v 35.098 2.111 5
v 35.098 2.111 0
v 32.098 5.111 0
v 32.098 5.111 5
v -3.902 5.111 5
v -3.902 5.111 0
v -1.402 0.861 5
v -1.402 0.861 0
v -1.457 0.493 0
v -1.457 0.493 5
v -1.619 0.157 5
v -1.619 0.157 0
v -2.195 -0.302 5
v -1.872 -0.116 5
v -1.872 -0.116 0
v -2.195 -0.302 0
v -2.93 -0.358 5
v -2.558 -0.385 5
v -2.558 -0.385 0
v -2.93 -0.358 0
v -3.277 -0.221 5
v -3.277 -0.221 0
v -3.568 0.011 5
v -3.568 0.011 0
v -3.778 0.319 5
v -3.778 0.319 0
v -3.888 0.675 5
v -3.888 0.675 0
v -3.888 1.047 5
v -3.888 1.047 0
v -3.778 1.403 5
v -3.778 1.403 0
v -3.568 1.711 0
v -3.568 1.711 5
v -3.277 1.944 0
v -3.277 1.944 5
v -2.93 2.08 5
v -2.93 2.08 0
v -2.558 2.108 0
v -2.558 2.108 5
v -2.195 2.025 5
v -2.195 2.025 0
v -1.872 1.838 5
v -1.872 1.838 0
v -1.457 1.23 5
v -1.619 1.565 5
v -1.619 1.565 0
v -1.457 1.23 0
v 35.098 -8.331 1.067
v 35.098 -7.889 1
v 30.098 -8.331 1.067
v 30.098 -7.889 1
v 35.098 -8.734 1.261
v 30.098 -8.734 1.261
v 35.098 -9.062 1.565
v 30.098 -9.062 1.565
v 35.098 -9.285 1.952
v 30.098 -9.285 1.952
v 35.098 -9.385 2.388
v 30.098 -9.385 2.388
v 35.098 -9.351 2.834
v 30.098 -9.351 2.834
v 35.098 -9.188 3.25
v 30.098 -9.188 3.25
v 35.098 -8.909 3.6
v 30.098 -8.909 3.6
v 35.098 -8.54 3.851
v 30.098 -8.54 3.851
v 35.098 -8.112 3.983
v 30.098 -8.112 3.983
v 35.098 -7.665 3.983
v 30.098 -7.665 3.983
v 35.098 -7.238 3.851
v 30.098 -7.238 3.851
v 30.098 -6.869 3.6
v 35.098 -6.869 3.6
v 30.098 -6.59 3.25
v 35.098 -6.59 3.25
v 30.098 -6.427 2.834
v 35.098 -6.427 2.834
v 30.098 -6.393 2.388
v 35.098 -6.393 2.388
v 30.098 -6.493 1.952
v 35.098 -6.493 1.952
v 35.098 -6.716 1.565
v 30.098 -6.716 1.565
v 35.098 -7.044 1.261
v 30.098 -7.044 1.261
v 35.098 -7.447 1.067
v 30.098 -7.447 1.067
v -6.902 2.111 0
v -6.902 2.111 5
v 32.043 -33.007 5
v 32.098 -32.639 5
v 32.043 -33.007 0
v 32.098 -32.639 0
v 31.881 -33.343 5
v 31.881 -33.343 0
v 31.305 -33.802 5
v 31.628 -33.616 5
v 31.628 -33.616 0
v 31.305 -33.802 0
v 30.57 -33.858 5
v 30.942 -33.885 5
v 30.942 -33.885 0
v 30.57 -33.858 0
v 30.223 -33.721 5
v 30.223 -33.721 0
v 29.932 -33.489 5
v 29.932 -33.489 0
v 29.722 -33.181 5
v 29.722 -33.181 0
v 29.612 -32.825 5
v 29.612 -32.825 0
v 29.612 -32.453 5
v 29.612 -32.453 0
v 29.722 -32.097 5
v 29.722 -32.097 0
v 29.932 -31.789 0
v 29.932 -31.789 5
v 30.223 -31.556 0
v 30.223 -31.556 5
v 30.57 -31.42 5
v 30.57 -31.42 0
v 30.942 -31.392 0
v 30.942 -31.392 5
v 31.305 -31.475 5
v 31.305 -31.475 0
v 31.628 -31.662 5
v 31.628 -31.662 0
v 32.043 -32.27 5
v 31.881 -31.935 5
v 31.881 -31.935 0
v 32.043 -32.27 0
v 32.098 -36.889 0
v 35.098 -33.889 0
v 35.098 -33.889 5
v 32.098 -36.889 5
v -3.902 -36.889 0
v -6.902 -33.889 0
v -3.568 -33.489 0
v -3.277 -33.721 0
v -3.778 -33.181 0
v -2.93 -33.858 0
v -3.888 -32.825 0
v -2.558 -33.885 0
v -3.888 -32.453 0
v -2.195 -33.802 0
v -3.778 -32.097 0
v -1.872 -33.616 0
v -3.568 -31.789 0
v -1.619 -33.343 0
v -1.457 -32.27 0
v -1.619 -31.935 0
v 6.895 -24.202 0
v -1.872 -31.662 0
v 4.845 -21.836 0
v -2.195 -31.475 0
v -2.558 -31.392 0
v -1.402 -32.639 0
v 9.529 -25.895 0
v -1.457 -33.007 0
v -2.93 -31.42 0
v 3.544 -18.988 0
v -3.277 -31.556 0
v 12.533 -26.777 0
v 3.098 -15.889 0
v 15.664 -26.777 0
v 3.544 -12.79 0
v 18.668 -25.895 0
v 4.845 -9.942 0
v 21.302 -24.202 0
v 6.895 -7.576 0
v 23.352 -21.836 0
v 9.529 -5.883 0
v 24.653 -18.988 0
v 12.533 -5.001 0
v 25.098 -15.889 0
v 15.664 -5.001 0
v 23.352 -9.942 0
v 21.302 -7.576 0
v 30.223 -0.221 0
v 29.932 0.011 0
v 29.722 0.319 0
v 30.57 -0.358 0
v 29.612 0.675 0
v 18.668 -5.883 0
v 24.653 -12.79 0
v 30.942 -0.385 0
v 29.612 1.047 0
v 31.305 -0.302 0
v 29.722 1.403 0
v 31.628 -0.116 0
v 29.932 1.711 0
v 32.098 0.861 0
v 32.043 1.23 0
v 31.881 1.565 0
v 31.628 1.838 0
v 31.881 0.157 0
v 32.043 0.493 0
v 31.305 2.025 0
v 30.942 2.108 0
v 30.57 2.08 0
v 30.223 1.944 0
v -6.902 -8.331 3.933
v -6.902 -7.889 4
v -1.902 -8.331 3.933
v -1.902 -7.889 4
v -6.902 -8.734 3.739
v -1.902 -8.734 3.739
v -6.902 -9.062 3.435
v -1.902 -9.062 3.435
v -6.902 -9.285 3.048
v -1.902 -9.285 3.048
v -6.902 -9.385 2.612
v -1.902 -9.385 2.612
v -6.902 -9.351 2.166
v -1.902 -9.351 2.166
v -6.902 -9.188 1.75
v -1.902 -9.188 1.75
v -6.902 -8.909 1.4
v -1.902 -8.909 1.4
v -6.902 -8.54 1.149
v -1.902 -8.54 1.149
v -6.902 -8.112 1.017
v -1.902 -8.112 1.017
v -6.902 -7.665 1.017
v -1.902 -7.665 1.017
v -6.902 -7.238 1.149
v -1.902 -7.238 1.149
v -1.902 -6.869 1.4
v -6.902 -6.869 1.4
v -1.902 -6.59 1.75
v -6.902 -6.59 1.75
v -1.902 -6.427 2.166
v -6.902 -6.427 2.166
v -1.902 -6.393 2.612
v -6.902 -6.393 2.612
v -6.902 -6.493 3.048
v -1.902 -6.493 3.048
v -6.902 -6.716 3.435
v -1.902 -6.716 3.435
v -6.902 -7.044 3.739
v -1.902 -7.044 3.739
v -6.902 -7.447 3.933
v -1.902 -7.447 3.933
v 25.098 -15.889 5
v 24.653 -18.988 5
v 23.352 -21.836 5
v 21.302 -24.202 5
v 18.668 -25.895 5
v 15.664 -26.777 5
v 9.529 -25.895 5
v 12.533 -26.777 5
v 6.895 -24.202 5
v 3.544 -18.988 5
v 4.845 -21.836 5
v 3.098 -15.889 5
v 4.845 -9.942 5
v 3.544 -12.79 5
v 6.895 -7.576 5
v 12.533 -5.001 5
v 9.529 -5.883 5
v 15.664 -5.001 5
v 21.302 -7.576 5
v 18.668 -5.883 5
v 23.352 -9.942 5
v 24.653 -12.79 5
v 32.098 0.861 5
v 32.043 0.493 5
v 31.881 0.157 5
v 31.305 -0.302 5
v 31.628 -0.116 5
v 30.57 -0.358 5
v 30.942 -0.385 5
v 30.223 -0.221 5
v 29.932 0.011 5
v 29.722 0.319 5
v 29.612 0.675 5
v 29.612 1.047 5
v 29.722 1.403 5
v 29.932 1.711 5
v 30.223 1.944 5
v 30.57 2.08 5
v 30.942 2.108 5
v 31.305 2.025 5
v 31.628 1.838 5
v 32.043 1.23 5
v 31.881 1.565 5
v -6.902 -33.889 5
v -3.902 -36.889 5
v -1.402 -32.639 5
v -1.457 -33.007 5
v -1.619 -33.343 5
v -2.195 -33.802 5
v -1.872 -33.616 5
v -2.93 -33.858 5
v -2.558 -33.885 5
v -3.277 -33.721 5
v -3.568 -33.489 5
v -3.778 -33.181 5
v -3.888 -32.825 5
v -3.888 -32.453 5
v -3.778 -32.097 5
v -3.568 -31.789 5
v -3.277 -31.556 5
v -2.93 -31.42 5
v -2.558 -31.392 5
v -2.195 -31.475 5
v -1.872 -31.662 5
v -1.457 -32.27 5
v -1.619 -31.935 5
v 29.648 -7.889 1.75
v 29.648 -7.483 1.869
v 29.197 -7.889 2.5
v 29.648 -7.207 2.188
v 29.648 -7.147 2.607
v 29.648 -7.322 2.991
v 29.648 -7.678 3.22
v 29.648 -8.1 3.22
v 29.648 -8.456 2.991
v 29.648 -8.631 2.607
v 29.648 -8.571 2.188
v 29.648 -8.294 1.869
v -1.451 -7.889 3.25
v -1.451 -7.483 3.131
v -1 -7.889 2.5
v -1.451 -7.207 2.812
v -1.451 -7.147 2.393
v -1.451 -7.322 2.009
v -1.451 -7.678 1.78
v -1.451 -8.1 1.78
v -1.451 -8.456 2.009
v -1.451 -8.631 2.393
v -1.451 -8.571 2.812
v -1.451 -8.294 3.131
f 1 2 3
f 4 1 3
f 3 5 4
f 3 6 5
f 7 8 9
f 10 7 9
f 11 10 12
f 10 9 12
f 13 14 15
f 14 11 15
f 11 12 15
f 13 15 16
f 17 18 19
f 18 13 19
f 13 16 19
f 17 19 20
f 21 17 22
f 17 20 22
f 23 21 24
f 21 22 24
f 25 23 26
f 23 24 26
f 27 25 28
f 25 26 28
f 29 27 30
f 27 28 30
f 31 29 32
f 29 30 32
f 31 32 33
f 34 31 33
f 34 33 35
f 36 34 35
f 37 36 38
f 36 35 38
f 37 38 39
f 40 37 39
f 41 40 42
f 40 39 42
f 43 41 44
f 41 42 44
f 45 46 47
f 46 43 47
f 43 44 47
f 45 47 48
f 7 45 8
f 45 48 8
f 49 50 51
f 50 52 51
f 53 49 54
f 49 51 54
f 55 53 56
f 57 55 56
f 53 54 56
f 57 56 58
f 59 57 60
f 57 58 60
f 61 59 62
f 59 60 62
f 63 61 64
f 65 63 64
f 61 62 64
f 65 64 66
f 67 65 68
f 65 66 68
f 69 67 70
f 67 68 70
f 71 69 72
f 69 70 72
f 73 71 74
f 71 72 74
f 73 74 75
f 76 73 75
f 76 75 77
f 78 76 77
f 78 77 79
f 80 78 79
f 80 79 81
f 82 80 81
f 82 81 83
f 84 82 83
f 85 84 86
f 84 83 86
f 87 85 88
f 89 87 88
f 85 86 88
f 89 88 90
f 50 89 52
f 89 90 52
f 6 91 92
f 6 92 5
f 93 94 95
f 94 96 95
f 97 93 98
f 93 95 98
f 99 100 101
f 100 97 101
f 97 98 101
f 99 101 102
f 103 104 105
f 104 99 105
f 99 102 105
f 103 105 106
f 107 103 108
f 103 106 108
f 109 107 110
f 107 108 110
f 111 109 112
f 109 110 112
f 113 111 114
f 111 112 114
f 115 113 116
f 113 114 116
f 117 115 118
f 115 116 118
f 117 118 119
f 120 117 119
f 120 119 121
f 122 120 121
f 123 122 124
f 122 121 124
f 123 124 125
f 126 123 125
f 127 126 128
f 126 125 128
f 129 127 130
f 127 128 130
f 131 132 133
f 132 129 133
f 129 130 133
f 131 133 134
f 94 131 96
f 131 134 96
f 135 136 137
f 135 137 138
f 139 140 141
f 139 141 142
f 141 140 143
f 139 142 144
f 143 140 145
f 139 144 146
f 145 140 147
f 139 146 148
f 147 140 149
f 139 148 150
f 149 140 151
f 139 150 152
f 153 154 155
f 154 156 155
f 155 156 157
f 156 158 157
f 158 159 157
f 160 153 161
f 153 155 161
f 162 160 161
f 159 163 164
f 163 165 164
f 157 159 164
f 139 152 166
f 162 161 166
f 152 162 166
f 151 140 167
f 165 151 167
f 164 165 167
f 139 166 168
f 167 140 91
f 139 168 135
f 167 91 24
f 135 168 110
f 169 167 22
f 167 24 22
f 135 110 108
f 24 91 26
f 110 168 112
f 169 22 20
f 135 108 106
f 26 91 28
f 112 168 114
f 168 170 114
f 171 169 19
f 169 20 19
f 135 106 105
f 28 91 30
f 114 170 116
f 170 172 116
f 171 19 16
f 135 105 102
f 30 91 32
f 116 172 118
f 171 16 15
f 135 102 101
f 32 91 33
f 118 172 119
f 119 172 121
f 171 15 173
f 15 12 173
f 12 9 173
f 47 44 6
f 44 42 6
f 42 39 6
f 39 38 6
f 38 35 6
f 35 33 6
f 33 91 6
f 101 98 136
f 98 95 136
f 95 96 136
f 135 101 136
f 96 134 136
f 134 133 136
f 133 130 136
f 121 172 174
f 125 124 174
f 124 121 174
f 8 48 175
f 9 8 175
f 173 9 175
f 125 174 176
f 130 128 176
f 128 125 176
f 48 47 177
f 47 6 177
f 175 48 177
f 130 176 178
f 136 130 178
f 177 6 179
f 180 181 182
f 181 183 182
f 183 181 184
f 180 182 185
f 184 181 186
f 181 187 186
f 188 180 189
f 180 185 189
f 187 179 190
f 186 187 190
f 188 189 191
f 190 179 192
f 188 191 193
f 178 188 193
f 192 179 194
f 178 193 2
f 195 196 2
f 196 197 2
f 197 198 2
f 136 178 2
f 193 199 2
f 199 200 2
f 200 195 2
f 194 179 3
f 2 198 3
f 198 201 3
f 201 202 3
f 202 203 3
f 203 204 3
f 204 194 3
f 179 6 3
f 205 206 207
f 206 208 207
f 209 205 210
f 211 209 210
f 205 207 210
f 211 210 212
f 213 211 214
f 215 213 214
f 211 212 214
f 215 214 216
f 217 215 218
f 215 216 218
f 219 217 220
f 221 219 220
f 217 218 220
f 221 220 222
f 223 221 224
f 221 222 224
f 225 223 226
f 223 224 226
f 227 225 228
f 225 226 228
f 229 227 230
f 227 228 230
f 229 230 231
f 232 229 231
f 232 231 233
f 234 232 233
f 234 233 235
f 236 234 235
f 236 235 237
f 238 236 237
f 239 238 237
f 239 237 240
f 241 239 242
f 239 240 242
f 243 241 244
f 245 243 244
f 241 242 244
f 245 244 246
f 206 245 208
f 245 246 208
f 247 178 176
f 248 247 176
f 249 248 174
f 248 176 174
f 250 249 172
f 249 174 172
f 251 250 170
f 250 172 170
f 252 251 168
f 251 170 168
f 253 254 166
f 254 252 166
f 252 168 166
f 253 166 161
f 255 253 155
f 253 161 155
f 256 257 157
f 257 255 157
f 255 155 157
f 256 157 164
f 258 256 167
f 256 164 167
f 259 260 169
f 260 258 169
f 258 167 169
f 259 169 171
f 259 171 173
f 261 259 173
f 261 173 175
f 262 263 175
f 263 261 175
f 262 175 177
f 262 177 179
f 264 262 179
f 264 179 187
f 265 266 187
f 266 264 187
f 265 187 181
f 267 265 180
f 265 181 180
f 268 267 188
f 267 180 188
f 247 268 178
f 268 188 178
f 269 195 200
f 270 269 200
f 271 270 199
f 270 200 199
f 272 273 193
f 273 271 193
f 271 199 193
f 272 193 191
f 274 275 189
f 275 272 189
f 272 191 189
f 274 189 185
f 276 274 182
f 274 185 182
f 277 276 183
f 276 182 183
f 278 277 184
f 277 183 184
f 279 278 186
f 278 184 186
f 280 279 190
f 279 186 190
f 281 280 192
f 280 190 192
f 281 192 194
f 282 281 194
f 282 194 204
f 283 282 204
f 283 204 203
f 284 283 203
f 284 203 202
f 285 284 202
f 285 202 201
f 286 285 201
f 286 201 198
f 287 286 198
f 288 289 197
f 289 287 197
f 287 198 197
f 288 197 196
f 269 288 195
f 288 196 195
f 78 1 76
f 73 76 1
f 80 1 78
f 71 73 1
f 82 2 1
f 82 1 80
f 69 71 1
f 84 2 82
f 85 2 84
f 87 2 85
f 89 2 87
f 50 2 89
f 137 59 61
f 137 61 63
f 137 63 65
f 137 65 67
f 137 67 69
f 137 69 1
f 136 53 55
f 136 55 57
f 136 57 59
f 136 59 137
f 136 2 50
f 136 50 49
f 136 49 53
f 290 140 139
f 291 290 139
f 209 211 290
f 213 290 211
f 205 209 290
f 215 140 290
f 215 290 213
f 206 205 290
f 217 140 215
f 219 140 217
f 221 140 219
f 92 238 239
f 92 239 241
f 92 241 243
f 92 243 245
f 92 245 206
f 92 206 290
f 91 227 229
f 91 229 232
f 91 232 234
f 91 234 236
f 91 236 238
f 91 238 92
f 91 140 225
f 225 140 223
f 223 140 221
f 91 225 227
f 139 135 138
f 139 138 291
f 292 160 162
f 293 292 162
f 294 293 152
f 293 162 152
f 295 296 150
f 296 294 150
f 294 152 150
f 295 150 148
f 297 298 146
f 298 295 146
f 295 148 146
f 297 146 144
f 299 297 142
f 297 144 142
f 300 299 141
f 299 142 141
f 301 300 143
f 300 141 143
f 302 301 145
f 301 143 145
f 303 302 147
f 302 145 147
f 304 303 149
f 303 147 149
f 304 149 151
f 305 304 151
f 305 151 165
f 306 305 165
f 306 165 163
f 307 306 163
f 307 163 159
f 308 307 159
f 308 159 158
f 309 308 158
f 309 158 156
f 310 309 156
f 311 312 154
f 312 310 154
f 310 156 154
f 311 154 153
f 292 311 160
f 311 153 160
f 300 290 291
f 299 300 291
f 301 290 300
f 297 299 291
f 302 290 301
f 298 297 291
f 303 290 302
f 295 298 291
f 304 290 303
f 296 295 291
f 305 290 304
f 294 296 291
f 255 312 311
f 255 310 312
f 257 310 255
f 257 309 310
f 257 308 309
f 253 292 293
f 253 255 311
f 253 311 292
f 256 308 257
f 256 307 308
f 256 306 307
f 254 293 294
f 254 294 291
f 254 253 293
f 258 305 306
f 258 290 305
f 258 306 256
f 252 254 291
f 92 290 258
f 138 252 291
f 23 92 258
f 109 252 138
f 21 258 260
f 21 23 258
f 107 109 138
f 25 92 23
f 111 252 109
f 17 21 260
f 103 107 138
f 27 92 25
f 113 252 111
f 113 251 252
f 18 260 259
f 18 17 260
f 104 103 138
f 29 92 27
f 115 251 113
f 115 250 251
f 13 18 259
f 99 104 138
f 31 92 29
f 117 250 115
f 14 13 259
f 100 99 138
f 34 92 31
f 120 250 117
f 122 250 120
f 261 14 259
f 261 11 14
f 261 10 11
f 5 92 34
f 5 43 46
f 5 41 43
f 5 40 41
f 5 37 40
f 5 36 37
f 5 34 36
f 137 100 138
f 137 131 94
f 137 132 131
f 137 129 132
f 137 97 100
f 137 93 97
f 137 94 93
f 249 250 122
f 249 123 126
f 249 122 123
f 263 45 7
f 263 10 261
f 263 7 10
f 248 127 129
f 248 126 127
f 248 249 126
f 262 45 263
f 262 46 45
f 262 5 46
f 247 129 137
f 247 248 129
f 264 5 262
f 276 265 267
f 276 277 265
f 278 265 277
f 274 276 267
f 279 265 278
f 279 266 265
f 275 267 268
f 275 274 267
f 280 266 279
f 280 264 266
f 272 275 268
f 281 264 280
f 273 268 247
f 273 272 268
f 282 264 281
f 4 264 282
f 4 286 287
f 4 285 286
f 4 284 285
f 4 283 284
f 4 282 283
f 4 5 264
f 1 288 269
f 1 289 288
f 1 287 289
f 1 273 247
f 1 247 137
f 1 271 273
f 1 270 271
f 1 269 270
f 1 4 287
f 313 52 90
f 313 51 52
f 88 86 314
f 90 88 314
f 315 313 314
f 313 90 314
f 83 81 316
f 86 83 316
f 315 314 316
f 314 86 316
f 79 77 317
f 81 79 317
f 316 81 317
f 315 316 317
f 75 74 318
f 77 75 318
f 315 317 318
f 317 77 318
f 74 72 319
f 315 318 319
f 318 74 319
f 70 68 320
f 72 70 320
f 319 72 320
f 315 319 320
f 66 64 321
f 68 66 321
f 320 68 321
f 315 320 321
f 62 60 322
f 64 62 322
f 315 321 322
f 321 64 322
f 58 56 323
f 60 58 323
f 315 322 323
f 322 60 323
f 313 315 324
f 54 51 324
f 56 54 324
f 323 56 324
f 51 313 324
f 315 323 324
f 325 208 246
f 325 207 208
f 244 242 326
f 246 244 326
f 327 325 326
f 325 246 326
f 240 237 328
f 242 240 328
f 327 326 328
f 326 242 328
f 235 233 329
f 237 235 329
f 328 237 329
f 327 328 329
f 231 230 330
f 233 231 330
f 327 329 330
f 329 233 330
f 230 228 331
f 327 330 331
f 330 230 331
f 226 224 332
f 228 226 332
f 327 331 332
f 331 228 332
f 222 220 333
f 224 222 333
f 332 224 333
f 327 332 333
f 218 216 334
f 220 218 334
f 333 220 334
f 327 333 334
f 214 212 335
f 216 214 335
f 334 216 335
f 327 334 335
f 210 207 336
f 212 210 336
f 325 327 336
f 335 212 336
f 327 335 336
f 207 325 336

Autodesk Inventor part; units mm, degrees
ref_plane "YZ Plane" through (0, 0, 0) normal (1, 0, 0) x (0, 1, 0)
ref_plane "XZ Plane" through (0, 0, 0) normal (0, 1, 0) x (-1, 0, 0)
ref_plane "XY Plane" through (0, 0, 0) normal (0, 0, 1) x (1, 0, 0)
sketch "Sketch1" plane through (0, 0, 0) normal (0, 0, 1) x (1, 0, 0)
  line L0 (-3.9016, 5.1111) -> (32.0984, 5.1111)
  line L1 (35.0984, 2.1111) -> (35.0984, -33.8889)
  line L2 (32.0984, -36.8889) -> (-3.9016, -36.8889)
  line L3 (-6.9016, -33.8889) -> (-6.9016, 2.1111)
  circle A0 centre (14.0984, -15.8889) radius 11
  line L4 (35.0984, 2.1111) -> (32.0984, 5.1111)
  line L5 (-6.9016, 2.1111) -> (-3.9016, 5.1111)
  line L6 (-6.9016, -33.8889) -> (-3.9016, -36.8889)
  line L7 (35.0984, -33.8889) -> (32.0984, -36.8889)
  circle A1 centre (30.8484, -32.6389) radius 1.25
  circle A2 centre (-2.6516, -32.6389) radius 1.25
  circle A3 centre (-2.6516, 0.8611) radius 1.25
  circle A4 centre (30.8484, 0.8611) radius 1.25
  point P0 (0, 0)
extrude "Extrusion8" add sketch "Sketch1" along normal blind 5
sketch "Sketch2" plane through (35.0984, -33.8889, 0) normal (1, 0, 0) x (0, 0, -1)
  circle A0 centre (-2.5, 26) radius 1.5
  point P0 (0, 33.8889)
  point P1 (-5, -3)
hole "Hole1" at (35.0984, -7.8889, 2.5) direction (-1, 0, 0) diameter 3 depth 5 tip angle 118
sketch "Sketch3" plane through (-6.9016, -33.8889, 0) normal (-1, 0, 0) x (0, 0, 1)
  circle A0 centre (2.5, 26) radius 1.5 projected
  circle A1 centre (2.5, 26) radius 1.5
  point P0 (0, 33.8889)
hole "Hole3" at (-6.9016, -7.8889, 2.5) direction (1, 0, 0) diameter 3 depth 5 tip angle 118
thread "Thread1" size "M3x0.5" class "6H" standard "ANSI Metric M Profile" full length
thread "Thread2" size "M3x0.5" class "6H" standard "ANSI Metric M Profile" full length
properties part number "attachment motor" material "Lead"
